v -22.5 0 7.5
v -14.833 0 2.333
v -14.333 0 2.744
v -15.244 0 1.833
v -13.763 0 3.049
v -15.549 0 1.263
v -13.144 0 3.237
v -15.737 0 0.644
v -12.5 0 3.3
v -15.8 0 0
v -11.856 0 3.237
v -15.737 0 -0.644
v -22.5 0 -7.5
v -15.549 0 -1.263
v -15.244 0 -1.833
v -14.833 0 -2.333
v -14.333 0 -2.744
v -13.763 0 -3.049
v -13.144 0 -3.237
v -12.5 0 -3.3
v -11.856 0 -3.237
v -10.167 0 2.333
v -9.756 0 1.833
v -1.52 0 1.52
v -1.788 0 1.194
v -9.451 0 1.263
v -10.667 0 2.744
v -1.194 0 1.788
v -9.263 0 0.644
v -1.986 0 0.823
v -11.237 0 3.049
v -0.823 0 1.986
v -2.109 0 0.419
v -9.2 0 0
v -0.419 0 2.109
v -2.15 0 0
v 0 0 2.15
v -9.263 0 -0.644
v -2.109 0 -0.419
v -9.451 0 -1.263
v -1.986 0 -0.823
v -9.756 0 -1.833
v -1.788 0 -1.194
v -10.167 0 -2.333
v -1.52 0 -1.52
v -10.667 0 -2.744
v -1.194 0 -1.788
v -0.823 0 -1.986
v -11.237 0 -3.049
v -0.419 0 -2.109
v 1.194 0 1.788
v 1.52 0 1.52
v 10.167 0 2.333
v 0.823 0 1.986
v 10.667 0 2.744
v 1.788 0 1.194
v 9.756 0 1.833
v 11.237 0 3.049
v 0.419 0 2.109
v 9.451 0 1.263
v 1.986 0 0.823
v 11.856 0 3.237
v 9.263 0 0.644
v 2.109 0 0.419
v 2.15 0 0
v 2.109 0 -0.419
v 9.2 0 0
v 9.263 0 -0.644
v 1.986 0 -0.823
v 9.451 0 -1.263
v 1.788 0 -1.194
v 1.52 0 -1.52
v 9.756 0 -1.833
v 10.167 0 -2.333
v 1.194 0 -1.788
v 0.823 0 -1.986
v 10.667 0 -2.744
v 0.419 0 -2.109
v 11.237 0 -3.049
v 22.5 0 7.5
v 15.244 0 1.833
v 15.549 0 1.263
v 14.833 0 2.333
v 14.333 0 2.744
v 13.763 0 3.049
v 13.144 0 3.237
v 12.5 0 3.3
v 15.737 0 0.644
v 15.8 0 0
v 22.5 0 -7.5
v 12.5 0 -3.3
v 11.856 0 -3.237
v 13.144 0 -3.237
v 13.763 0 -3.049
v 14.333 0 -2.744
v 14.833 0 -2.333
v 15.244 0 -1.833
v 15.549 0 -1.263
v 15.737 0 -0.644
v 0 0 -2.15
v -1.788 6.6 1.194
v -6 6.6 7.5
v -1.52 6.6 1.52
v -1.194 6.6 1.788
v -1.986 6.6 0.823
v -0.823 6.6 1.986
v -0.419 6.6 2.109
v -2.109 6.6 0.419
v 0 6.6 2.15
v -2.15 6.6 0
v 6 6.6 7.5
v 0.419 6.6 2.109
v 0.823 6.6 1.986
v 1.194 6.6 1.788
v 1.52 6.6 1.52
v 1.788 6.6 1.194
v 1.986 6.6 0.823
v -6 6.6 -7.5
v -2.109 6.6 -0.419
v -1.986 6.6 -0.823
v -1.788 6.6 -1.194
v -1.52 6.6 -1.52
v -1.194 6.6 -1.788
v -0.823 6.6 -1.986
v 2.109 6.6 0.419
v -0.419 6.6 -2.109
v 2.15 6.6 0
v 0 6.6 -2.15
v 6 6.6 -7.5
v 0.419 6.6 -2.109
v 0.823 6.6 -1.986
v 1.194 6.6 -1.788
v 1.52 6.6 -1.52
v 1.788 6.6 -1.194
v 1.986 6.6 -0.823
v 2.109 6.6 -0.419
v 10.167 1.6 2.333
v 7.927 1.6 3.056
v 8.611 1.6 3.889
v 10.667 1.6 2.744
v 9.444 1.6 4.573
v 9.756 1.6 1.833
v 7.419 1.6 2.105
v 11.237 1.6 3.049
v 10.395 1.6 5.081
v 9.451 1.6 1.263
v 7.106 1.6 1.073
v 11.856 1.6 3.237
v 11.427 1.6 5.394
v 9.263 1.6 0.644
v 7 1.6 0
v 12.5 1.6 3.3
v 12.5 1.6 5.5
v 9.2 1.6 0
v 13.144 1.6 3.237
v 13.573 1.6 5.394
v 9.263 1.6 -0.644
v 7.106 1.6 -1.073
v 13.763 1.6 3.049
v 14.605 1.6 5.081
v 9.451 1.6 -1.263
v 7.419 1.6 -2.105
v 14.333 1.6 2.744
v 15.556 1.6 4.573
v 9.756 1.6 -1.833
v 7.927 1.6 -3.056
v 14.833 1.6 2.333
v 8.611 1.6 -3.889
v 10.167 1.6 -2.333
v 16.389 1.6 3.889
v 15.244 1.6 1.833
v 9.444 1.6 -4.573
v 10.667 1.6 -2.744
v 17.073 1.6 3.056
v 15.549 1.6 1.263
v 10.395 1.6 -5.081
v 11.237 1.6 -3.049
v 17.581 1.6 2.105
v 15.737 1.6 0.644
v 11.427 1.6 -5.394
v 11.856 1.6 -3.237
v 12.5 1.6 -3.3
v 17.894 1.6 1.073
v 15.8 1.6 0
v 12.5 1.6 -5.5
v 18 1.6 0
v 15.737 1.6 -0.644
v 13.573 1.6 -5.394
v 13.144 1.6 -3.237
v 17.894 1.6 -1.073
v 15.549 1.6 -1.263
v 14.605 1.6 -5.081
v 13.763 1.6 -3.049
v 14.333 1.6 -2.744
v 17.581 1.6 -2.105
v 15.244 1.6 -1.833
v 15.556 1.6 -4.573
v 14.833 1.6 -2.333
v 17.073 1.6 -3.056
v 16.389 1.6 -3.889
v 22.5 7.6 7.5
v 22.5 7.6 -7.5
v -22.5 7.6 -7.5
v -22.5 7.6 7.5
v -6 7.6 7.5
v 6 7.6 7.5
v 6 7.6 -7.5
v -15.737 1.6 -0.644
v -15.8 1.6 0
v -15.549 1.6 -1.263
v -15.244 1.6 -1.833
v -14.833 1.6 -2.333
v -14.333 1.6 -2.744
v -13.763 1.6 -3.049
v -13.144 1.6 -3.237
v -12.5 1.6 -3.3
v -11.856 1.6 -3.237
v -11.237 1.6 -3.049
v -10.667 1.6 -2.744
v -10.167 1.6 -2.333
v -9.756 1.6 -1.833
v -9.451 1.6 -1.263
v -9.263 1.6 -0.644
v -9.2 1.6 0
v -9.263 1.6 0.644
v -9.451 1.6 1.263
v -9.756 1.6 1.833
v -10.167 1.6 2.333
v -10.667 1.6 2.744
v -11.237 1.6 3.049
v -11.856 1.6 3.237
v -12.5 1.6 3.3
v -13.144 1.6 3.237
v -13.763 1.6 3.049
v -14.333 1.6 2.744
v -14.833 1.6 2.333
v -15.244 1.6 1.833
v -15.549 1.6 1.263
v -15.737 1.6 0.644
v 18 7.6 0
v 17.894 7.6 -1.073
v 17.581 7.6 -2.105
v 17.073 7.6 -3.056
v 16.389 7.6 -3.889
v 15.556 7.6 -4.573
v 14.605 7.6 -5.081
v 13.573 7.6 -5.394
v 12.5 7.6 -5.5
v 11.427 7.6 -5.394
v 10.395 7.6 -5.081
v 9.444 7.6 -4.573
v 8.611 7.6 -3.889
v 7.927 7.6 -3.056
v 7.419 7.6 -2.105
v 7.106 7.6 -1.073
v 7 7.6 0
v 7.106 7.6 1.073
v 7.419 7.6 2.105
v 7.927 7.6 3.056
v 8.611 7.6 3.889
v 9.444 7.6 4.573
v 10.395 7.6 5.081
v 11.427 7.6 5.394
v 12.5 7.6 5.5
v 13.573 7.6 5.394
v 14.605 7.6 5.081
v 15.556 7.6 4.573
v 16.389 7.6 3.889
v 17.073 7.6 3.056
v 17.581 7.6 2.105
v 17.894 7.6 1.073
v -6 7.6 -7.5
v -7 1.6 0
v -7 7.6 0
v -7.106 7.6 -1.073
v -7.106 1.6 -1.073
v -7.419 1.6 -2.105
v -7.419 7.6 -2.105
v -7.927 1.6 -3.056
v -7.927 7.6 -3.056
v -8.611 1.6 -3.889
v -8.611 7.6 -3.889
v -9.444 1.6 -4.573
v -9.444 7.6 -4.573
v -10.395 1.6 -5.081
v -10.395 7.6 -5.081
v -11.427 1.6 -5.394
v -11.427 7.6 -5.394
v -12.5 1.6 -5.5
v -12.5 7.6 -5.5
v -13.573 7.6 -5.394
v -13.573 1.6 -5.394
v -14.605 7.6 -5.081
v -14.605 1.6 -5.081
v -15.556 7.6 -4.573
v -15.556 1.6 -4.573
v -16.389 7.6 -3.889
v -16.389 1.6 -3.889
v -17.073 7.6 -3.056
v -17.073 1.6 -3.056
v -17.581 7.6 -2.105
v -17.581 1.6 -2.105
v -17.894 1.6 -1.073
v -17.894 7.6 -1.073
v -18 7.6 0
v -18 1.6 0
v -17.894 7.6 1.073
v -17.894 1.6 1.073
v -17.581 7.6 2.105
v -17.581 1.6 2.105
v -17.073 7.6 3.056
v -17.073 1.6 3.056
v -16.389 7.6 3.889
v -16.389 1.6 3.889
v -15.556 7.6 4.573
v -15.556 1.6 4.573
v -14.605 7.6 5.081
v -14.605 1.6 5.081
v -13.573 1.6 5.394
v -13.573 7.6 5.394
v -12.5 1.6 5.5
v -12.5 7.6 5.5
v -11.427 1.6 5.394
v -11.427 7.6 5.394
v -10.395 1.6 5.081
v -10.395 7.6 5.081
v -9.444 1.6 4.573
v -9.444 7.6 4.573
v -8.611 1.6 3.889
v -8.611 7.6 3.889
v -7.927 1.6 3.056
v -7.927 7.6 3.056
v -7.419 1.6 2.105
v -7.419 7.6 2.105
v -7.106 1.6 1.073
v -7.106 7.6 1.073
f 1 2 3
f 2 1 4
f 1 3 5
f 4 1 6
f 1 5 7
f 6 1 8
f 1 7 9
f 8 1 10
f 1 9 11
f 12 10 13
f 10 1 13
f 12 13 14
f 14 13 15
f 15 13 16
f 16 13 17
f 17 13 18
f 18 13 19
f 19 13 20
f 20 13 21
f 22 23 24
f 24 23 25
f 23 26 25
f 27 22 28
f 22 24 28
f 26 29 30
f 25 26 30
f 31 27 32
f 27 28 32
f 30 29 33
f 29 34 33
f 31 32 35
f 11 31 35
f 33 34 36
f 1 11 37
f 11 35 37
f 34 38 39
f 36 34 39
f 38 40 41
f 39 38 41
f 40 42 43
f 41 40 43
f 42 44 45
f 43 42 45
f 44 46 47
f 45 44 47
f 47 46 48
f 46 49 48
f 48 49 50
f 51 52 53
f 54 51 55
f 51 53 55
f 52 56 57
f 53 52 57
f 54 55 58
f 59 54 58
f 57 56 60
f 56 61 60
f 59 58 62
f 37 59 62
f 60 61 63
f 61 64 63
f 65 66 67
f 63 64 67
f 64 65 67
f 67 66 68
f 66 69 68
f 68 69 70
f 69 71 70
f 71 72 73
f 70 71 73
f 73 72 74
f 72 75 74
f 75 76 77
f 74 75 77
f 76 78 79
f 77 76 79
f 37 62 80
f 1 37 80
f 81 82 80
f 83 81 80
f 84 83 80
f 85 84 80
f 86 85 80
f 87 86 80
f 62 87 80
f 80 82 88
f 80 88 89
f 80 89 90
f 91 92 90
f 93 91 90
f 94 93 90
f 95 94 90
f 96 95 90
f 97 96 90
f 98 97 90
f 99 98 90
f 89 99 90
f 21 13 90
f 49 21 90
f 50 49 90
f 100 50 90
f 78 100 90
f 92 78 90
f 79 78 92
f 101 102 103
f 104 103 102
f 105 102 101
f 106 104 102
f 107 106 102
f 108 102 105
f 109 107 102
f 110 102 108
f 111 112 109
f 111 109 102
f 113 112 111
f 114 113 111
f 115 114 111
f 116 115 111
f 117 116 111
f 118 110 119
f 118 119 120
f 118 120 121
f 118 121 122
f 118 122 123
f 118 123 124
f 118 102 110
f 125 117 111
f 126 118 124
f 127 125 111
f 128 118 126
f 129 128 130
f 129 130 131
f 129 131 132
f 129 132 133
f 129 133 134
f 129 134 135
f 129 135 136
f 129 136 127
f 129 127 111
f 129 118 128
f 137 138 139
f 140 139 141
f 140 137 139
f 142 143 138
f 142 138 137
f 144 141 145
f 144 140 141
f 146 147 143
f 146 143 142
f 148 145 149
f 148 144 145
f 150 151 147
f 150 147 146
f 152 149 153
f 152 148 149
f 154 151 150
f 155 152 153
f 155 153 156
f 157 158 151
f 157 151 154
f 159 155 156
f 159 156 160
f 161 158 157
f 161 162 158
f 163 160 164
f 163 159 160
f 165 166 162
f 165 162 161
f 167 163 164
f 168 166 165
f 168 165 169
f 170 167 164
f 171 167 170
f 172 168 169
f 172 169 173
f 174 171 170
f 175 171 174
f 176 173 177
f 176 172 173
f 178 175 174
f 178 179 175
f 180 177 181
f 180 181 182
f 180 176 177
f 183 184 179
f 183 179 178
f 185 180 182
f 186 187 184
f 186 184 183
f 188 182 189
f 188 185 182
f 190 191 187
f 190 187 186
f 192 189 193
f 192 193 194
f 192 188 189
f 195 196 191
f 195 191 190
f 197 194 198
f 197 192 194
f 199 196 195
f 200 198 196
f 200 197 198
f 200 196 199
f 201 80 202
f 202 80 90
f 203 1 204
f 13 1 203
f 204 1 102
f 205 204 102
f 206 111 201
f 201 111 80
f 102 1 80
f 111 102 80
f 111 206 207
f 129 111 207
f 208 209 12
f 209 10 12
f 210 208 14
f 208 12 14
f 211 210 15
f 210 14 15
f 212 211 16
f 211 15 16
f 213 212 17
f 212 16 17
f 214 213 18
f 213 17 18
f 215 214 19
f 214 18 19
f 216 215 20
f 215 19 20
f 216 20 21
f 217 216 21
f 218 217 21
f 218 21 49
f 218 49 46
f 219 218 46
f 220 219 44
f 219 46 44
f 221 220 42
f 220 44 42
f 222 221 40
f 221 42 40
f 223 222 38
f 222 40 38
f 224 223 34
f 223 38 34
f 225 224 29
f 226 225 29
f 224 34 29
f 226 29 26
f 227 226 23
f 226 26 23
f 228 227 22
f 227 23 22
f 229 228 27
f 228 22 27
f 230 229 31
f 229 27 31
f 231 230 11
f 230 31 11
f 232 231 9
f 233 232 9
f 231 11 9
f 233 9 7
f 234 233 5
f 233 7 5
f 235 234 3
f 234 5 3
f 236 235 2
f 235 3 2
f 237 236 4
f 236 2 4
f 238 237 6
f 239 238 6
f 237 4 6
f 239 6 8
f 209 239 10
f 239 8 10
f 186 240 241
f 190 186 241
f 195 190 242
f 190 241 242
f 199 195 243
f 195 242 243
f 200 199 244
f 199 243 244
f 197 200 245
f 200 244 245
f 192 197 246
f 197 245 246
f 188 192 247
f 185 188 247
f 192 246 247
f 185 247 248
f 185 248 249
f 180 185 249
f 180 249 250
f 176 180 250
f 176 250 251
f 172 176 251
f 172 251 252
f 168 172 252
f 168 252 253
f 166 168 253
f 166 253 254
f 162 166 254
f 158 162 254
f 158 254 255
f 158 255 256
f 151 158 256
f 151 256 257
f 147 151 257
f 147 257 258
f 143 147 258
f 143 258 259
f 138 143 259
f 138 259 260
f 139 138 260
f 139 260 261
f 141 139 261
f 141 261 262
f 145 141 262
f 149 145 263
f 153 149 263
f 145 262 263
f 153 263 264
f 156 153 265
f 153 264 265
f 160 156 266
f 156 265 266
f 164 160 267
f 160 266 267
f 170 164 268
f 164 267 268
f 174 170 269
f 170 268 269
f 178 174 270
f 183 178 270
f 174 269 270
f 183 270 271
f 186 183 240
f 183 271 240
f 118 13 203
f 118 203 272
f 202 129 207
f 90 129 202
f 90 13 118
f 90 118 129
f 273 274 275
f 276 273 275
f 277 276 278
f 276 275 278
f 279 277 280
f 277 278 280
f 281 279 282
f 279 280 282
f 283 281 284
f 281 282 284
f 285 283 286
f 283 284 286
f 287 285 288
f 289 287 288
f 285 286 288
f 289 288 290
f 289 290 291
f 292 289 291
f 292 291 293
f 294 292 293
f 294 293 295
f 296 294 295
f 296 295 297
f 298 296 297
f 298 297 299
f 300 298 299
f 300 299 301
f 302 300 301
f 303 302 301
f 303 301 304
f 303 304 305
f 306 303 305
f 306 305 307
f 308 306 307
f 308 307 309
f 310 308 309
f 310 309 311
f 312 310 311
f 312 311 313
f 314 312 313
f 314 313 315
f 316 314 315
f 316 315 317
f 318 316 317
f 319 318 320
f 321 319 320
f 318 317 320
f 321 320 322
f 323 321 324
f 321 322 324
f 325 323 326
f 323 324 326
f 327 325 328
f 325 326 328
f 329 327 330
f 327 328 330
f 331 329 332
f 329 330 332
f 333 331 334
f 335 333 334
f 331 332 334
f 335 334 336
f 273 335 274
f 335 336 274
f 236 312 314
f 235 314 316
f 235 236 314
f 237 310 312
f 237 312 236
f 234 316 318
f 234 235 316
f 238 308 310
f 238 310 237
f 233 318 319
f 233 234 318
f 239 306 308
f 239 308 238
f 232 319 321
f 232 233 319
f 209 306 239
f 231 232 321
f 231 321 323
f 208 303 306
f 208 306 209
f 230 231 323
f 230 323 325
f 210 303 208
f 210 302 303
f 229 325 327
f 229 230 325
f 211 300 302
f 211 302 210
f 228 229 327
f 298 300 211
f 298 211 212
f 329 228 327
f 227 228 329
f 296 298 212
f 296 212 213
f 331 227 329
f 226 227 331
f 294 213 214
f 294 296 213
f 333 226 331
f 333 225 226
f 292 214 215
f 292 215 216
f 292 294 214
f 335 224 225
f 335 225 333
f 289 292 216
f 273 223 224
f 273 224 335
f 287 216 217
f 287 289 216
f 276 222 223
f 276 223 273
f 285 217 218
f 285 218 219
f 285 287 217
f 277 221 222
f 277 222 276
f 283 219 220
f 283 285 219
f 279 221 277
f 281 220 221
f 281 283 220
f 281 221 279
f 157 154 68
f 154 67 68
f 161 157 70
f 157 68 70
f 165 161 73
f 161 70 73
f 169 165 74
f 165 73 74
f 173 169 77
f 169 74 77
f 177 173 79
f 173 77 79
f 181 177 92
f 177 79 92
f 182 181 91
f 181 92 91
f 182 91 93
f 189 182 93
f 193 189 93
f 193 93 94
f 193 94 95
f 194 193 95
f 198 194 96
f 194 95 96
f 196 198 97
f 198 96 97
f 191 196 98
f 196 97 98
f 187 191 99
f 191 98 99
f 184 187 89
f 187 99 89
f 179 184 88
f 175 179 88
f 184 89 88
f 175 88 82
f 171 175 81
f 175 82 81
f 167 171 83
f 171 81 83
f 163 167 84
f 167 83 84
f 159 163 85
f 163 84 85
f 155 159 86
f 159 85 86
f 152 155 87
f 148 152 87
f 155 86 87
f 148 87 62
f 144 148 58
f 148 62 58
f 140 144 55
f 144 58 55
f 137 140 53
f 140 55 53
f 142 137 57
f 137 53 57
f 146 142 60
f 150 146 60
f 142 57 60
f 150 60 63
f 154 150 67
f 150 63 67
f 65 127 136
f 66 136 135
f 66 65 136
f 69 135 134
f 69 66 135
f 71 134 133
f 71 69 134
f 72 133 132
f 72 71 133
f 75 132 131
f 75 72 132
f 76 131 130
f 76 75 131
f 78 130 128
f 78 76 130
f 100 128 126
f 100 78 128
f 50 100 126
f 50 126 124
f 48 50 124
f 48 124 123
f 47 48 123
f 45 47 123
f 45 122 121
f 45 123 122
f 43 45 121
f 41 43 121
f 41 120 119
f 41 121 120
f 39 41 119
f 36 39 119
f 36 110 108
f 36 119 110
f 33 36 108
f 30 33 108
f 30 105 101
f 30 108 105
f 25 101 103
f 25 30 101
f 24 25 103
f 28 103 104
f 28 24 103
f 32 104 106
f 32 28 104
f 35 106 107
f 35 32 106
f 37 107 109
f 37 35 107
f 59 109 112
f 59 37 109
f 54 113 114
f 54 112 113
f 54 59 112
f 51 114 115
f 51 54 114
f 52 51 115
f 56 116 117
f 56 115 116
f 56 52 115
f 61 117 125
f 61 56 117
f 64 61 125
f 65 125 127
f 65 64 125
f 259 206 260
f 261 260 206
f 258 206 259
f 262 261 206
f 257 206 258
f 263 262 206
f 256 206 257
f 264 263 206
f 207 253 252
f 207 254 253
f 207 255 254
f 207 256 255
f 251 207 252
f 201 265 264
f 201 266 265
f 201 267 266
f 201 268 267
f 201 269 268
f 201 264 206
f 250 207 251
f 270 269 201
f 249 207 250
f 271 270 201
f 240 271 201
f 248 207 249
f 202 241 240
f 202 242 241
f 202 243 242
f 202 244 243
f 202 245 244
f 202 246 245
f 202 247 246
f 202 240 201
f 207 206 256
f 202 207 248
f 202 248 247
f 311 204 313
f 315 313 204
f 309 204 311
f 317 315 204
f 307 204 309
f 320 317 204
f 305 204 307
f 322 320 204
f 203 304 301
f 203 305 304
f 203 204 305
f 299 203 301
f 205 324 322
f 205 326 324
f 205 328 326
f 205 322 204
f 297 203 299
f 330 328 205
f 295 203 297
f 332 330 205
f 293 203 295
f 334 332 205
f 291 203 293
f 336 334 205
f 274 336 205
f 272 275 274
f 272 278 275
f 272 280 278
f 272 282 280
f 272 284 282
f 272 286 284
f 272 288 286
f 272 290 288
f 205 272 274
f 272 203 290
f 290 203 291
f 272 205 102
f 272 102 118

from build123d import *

# Parameters (mm, degrees)
SKETCH1_W                      = 45
SKETCH1_H                      = 15
SKETCH1_R                      = 2.15
BOSS_EXTRUDE1_DEPTH            = 7.6
CBORE_FOR_M6_SHCS1_D           = 6.6
CBORE_FOR_M6_SHCS1_CBORE_D     = 11
CBORE_FOR_M6_SHCS1_CBORE_DEPTH = 6
SKETCH5_W                      = 12
SKETCH5_H                      = 15
CUT_EXTRUDE2_DEPTH             = 1


with BuildPart() as part:
    # Sketch1 → Boss-Extrude1 (new body)
    with BuildSketch(Plane(origin=(0, 0, 0), x_dir=(1, 0, 0), z_dir=(0, 1, 0))):
        Rectangle(SKETCH1_W, SKETCH1_H)
        Circle(SKETCH1_R, mode=Mode.SUBTRACT)
    extrude(amount=BOSS_EXTRUDE1_DEPTH)

    # CBORE for M6 SHCS1 (through all)
    with Locations(Plane(origin=(0, 7.6, 0), x_dir=(1, 0, 0), z_dir=(0, 1, 0))):
        with Locations((-12.5, 0), (12.5, 0)):
            CounterBoreHole(CBORE_FOR_M6_SHCS1_D / 2, CBORE_FOR_M6_SHCS1_CBORE_D / 2, CBORE_FOR_M6_SHCS1_CBORE_DEPTH)

    # Sketch5 → Cut-Extrude2 (cut)
    with BuildSketch(Plane(origin=(0, 7.6, 0), x_dir=(1, 0, 0), z_dir=(0, 1, 0))):
        Rectangle(SKETCH5_W, SKETCH5_H)
    extrude(amount=-CUT_EXTRUDE2_DEPTH, mode=Mode.SUBTRACT)


solid = part.part
